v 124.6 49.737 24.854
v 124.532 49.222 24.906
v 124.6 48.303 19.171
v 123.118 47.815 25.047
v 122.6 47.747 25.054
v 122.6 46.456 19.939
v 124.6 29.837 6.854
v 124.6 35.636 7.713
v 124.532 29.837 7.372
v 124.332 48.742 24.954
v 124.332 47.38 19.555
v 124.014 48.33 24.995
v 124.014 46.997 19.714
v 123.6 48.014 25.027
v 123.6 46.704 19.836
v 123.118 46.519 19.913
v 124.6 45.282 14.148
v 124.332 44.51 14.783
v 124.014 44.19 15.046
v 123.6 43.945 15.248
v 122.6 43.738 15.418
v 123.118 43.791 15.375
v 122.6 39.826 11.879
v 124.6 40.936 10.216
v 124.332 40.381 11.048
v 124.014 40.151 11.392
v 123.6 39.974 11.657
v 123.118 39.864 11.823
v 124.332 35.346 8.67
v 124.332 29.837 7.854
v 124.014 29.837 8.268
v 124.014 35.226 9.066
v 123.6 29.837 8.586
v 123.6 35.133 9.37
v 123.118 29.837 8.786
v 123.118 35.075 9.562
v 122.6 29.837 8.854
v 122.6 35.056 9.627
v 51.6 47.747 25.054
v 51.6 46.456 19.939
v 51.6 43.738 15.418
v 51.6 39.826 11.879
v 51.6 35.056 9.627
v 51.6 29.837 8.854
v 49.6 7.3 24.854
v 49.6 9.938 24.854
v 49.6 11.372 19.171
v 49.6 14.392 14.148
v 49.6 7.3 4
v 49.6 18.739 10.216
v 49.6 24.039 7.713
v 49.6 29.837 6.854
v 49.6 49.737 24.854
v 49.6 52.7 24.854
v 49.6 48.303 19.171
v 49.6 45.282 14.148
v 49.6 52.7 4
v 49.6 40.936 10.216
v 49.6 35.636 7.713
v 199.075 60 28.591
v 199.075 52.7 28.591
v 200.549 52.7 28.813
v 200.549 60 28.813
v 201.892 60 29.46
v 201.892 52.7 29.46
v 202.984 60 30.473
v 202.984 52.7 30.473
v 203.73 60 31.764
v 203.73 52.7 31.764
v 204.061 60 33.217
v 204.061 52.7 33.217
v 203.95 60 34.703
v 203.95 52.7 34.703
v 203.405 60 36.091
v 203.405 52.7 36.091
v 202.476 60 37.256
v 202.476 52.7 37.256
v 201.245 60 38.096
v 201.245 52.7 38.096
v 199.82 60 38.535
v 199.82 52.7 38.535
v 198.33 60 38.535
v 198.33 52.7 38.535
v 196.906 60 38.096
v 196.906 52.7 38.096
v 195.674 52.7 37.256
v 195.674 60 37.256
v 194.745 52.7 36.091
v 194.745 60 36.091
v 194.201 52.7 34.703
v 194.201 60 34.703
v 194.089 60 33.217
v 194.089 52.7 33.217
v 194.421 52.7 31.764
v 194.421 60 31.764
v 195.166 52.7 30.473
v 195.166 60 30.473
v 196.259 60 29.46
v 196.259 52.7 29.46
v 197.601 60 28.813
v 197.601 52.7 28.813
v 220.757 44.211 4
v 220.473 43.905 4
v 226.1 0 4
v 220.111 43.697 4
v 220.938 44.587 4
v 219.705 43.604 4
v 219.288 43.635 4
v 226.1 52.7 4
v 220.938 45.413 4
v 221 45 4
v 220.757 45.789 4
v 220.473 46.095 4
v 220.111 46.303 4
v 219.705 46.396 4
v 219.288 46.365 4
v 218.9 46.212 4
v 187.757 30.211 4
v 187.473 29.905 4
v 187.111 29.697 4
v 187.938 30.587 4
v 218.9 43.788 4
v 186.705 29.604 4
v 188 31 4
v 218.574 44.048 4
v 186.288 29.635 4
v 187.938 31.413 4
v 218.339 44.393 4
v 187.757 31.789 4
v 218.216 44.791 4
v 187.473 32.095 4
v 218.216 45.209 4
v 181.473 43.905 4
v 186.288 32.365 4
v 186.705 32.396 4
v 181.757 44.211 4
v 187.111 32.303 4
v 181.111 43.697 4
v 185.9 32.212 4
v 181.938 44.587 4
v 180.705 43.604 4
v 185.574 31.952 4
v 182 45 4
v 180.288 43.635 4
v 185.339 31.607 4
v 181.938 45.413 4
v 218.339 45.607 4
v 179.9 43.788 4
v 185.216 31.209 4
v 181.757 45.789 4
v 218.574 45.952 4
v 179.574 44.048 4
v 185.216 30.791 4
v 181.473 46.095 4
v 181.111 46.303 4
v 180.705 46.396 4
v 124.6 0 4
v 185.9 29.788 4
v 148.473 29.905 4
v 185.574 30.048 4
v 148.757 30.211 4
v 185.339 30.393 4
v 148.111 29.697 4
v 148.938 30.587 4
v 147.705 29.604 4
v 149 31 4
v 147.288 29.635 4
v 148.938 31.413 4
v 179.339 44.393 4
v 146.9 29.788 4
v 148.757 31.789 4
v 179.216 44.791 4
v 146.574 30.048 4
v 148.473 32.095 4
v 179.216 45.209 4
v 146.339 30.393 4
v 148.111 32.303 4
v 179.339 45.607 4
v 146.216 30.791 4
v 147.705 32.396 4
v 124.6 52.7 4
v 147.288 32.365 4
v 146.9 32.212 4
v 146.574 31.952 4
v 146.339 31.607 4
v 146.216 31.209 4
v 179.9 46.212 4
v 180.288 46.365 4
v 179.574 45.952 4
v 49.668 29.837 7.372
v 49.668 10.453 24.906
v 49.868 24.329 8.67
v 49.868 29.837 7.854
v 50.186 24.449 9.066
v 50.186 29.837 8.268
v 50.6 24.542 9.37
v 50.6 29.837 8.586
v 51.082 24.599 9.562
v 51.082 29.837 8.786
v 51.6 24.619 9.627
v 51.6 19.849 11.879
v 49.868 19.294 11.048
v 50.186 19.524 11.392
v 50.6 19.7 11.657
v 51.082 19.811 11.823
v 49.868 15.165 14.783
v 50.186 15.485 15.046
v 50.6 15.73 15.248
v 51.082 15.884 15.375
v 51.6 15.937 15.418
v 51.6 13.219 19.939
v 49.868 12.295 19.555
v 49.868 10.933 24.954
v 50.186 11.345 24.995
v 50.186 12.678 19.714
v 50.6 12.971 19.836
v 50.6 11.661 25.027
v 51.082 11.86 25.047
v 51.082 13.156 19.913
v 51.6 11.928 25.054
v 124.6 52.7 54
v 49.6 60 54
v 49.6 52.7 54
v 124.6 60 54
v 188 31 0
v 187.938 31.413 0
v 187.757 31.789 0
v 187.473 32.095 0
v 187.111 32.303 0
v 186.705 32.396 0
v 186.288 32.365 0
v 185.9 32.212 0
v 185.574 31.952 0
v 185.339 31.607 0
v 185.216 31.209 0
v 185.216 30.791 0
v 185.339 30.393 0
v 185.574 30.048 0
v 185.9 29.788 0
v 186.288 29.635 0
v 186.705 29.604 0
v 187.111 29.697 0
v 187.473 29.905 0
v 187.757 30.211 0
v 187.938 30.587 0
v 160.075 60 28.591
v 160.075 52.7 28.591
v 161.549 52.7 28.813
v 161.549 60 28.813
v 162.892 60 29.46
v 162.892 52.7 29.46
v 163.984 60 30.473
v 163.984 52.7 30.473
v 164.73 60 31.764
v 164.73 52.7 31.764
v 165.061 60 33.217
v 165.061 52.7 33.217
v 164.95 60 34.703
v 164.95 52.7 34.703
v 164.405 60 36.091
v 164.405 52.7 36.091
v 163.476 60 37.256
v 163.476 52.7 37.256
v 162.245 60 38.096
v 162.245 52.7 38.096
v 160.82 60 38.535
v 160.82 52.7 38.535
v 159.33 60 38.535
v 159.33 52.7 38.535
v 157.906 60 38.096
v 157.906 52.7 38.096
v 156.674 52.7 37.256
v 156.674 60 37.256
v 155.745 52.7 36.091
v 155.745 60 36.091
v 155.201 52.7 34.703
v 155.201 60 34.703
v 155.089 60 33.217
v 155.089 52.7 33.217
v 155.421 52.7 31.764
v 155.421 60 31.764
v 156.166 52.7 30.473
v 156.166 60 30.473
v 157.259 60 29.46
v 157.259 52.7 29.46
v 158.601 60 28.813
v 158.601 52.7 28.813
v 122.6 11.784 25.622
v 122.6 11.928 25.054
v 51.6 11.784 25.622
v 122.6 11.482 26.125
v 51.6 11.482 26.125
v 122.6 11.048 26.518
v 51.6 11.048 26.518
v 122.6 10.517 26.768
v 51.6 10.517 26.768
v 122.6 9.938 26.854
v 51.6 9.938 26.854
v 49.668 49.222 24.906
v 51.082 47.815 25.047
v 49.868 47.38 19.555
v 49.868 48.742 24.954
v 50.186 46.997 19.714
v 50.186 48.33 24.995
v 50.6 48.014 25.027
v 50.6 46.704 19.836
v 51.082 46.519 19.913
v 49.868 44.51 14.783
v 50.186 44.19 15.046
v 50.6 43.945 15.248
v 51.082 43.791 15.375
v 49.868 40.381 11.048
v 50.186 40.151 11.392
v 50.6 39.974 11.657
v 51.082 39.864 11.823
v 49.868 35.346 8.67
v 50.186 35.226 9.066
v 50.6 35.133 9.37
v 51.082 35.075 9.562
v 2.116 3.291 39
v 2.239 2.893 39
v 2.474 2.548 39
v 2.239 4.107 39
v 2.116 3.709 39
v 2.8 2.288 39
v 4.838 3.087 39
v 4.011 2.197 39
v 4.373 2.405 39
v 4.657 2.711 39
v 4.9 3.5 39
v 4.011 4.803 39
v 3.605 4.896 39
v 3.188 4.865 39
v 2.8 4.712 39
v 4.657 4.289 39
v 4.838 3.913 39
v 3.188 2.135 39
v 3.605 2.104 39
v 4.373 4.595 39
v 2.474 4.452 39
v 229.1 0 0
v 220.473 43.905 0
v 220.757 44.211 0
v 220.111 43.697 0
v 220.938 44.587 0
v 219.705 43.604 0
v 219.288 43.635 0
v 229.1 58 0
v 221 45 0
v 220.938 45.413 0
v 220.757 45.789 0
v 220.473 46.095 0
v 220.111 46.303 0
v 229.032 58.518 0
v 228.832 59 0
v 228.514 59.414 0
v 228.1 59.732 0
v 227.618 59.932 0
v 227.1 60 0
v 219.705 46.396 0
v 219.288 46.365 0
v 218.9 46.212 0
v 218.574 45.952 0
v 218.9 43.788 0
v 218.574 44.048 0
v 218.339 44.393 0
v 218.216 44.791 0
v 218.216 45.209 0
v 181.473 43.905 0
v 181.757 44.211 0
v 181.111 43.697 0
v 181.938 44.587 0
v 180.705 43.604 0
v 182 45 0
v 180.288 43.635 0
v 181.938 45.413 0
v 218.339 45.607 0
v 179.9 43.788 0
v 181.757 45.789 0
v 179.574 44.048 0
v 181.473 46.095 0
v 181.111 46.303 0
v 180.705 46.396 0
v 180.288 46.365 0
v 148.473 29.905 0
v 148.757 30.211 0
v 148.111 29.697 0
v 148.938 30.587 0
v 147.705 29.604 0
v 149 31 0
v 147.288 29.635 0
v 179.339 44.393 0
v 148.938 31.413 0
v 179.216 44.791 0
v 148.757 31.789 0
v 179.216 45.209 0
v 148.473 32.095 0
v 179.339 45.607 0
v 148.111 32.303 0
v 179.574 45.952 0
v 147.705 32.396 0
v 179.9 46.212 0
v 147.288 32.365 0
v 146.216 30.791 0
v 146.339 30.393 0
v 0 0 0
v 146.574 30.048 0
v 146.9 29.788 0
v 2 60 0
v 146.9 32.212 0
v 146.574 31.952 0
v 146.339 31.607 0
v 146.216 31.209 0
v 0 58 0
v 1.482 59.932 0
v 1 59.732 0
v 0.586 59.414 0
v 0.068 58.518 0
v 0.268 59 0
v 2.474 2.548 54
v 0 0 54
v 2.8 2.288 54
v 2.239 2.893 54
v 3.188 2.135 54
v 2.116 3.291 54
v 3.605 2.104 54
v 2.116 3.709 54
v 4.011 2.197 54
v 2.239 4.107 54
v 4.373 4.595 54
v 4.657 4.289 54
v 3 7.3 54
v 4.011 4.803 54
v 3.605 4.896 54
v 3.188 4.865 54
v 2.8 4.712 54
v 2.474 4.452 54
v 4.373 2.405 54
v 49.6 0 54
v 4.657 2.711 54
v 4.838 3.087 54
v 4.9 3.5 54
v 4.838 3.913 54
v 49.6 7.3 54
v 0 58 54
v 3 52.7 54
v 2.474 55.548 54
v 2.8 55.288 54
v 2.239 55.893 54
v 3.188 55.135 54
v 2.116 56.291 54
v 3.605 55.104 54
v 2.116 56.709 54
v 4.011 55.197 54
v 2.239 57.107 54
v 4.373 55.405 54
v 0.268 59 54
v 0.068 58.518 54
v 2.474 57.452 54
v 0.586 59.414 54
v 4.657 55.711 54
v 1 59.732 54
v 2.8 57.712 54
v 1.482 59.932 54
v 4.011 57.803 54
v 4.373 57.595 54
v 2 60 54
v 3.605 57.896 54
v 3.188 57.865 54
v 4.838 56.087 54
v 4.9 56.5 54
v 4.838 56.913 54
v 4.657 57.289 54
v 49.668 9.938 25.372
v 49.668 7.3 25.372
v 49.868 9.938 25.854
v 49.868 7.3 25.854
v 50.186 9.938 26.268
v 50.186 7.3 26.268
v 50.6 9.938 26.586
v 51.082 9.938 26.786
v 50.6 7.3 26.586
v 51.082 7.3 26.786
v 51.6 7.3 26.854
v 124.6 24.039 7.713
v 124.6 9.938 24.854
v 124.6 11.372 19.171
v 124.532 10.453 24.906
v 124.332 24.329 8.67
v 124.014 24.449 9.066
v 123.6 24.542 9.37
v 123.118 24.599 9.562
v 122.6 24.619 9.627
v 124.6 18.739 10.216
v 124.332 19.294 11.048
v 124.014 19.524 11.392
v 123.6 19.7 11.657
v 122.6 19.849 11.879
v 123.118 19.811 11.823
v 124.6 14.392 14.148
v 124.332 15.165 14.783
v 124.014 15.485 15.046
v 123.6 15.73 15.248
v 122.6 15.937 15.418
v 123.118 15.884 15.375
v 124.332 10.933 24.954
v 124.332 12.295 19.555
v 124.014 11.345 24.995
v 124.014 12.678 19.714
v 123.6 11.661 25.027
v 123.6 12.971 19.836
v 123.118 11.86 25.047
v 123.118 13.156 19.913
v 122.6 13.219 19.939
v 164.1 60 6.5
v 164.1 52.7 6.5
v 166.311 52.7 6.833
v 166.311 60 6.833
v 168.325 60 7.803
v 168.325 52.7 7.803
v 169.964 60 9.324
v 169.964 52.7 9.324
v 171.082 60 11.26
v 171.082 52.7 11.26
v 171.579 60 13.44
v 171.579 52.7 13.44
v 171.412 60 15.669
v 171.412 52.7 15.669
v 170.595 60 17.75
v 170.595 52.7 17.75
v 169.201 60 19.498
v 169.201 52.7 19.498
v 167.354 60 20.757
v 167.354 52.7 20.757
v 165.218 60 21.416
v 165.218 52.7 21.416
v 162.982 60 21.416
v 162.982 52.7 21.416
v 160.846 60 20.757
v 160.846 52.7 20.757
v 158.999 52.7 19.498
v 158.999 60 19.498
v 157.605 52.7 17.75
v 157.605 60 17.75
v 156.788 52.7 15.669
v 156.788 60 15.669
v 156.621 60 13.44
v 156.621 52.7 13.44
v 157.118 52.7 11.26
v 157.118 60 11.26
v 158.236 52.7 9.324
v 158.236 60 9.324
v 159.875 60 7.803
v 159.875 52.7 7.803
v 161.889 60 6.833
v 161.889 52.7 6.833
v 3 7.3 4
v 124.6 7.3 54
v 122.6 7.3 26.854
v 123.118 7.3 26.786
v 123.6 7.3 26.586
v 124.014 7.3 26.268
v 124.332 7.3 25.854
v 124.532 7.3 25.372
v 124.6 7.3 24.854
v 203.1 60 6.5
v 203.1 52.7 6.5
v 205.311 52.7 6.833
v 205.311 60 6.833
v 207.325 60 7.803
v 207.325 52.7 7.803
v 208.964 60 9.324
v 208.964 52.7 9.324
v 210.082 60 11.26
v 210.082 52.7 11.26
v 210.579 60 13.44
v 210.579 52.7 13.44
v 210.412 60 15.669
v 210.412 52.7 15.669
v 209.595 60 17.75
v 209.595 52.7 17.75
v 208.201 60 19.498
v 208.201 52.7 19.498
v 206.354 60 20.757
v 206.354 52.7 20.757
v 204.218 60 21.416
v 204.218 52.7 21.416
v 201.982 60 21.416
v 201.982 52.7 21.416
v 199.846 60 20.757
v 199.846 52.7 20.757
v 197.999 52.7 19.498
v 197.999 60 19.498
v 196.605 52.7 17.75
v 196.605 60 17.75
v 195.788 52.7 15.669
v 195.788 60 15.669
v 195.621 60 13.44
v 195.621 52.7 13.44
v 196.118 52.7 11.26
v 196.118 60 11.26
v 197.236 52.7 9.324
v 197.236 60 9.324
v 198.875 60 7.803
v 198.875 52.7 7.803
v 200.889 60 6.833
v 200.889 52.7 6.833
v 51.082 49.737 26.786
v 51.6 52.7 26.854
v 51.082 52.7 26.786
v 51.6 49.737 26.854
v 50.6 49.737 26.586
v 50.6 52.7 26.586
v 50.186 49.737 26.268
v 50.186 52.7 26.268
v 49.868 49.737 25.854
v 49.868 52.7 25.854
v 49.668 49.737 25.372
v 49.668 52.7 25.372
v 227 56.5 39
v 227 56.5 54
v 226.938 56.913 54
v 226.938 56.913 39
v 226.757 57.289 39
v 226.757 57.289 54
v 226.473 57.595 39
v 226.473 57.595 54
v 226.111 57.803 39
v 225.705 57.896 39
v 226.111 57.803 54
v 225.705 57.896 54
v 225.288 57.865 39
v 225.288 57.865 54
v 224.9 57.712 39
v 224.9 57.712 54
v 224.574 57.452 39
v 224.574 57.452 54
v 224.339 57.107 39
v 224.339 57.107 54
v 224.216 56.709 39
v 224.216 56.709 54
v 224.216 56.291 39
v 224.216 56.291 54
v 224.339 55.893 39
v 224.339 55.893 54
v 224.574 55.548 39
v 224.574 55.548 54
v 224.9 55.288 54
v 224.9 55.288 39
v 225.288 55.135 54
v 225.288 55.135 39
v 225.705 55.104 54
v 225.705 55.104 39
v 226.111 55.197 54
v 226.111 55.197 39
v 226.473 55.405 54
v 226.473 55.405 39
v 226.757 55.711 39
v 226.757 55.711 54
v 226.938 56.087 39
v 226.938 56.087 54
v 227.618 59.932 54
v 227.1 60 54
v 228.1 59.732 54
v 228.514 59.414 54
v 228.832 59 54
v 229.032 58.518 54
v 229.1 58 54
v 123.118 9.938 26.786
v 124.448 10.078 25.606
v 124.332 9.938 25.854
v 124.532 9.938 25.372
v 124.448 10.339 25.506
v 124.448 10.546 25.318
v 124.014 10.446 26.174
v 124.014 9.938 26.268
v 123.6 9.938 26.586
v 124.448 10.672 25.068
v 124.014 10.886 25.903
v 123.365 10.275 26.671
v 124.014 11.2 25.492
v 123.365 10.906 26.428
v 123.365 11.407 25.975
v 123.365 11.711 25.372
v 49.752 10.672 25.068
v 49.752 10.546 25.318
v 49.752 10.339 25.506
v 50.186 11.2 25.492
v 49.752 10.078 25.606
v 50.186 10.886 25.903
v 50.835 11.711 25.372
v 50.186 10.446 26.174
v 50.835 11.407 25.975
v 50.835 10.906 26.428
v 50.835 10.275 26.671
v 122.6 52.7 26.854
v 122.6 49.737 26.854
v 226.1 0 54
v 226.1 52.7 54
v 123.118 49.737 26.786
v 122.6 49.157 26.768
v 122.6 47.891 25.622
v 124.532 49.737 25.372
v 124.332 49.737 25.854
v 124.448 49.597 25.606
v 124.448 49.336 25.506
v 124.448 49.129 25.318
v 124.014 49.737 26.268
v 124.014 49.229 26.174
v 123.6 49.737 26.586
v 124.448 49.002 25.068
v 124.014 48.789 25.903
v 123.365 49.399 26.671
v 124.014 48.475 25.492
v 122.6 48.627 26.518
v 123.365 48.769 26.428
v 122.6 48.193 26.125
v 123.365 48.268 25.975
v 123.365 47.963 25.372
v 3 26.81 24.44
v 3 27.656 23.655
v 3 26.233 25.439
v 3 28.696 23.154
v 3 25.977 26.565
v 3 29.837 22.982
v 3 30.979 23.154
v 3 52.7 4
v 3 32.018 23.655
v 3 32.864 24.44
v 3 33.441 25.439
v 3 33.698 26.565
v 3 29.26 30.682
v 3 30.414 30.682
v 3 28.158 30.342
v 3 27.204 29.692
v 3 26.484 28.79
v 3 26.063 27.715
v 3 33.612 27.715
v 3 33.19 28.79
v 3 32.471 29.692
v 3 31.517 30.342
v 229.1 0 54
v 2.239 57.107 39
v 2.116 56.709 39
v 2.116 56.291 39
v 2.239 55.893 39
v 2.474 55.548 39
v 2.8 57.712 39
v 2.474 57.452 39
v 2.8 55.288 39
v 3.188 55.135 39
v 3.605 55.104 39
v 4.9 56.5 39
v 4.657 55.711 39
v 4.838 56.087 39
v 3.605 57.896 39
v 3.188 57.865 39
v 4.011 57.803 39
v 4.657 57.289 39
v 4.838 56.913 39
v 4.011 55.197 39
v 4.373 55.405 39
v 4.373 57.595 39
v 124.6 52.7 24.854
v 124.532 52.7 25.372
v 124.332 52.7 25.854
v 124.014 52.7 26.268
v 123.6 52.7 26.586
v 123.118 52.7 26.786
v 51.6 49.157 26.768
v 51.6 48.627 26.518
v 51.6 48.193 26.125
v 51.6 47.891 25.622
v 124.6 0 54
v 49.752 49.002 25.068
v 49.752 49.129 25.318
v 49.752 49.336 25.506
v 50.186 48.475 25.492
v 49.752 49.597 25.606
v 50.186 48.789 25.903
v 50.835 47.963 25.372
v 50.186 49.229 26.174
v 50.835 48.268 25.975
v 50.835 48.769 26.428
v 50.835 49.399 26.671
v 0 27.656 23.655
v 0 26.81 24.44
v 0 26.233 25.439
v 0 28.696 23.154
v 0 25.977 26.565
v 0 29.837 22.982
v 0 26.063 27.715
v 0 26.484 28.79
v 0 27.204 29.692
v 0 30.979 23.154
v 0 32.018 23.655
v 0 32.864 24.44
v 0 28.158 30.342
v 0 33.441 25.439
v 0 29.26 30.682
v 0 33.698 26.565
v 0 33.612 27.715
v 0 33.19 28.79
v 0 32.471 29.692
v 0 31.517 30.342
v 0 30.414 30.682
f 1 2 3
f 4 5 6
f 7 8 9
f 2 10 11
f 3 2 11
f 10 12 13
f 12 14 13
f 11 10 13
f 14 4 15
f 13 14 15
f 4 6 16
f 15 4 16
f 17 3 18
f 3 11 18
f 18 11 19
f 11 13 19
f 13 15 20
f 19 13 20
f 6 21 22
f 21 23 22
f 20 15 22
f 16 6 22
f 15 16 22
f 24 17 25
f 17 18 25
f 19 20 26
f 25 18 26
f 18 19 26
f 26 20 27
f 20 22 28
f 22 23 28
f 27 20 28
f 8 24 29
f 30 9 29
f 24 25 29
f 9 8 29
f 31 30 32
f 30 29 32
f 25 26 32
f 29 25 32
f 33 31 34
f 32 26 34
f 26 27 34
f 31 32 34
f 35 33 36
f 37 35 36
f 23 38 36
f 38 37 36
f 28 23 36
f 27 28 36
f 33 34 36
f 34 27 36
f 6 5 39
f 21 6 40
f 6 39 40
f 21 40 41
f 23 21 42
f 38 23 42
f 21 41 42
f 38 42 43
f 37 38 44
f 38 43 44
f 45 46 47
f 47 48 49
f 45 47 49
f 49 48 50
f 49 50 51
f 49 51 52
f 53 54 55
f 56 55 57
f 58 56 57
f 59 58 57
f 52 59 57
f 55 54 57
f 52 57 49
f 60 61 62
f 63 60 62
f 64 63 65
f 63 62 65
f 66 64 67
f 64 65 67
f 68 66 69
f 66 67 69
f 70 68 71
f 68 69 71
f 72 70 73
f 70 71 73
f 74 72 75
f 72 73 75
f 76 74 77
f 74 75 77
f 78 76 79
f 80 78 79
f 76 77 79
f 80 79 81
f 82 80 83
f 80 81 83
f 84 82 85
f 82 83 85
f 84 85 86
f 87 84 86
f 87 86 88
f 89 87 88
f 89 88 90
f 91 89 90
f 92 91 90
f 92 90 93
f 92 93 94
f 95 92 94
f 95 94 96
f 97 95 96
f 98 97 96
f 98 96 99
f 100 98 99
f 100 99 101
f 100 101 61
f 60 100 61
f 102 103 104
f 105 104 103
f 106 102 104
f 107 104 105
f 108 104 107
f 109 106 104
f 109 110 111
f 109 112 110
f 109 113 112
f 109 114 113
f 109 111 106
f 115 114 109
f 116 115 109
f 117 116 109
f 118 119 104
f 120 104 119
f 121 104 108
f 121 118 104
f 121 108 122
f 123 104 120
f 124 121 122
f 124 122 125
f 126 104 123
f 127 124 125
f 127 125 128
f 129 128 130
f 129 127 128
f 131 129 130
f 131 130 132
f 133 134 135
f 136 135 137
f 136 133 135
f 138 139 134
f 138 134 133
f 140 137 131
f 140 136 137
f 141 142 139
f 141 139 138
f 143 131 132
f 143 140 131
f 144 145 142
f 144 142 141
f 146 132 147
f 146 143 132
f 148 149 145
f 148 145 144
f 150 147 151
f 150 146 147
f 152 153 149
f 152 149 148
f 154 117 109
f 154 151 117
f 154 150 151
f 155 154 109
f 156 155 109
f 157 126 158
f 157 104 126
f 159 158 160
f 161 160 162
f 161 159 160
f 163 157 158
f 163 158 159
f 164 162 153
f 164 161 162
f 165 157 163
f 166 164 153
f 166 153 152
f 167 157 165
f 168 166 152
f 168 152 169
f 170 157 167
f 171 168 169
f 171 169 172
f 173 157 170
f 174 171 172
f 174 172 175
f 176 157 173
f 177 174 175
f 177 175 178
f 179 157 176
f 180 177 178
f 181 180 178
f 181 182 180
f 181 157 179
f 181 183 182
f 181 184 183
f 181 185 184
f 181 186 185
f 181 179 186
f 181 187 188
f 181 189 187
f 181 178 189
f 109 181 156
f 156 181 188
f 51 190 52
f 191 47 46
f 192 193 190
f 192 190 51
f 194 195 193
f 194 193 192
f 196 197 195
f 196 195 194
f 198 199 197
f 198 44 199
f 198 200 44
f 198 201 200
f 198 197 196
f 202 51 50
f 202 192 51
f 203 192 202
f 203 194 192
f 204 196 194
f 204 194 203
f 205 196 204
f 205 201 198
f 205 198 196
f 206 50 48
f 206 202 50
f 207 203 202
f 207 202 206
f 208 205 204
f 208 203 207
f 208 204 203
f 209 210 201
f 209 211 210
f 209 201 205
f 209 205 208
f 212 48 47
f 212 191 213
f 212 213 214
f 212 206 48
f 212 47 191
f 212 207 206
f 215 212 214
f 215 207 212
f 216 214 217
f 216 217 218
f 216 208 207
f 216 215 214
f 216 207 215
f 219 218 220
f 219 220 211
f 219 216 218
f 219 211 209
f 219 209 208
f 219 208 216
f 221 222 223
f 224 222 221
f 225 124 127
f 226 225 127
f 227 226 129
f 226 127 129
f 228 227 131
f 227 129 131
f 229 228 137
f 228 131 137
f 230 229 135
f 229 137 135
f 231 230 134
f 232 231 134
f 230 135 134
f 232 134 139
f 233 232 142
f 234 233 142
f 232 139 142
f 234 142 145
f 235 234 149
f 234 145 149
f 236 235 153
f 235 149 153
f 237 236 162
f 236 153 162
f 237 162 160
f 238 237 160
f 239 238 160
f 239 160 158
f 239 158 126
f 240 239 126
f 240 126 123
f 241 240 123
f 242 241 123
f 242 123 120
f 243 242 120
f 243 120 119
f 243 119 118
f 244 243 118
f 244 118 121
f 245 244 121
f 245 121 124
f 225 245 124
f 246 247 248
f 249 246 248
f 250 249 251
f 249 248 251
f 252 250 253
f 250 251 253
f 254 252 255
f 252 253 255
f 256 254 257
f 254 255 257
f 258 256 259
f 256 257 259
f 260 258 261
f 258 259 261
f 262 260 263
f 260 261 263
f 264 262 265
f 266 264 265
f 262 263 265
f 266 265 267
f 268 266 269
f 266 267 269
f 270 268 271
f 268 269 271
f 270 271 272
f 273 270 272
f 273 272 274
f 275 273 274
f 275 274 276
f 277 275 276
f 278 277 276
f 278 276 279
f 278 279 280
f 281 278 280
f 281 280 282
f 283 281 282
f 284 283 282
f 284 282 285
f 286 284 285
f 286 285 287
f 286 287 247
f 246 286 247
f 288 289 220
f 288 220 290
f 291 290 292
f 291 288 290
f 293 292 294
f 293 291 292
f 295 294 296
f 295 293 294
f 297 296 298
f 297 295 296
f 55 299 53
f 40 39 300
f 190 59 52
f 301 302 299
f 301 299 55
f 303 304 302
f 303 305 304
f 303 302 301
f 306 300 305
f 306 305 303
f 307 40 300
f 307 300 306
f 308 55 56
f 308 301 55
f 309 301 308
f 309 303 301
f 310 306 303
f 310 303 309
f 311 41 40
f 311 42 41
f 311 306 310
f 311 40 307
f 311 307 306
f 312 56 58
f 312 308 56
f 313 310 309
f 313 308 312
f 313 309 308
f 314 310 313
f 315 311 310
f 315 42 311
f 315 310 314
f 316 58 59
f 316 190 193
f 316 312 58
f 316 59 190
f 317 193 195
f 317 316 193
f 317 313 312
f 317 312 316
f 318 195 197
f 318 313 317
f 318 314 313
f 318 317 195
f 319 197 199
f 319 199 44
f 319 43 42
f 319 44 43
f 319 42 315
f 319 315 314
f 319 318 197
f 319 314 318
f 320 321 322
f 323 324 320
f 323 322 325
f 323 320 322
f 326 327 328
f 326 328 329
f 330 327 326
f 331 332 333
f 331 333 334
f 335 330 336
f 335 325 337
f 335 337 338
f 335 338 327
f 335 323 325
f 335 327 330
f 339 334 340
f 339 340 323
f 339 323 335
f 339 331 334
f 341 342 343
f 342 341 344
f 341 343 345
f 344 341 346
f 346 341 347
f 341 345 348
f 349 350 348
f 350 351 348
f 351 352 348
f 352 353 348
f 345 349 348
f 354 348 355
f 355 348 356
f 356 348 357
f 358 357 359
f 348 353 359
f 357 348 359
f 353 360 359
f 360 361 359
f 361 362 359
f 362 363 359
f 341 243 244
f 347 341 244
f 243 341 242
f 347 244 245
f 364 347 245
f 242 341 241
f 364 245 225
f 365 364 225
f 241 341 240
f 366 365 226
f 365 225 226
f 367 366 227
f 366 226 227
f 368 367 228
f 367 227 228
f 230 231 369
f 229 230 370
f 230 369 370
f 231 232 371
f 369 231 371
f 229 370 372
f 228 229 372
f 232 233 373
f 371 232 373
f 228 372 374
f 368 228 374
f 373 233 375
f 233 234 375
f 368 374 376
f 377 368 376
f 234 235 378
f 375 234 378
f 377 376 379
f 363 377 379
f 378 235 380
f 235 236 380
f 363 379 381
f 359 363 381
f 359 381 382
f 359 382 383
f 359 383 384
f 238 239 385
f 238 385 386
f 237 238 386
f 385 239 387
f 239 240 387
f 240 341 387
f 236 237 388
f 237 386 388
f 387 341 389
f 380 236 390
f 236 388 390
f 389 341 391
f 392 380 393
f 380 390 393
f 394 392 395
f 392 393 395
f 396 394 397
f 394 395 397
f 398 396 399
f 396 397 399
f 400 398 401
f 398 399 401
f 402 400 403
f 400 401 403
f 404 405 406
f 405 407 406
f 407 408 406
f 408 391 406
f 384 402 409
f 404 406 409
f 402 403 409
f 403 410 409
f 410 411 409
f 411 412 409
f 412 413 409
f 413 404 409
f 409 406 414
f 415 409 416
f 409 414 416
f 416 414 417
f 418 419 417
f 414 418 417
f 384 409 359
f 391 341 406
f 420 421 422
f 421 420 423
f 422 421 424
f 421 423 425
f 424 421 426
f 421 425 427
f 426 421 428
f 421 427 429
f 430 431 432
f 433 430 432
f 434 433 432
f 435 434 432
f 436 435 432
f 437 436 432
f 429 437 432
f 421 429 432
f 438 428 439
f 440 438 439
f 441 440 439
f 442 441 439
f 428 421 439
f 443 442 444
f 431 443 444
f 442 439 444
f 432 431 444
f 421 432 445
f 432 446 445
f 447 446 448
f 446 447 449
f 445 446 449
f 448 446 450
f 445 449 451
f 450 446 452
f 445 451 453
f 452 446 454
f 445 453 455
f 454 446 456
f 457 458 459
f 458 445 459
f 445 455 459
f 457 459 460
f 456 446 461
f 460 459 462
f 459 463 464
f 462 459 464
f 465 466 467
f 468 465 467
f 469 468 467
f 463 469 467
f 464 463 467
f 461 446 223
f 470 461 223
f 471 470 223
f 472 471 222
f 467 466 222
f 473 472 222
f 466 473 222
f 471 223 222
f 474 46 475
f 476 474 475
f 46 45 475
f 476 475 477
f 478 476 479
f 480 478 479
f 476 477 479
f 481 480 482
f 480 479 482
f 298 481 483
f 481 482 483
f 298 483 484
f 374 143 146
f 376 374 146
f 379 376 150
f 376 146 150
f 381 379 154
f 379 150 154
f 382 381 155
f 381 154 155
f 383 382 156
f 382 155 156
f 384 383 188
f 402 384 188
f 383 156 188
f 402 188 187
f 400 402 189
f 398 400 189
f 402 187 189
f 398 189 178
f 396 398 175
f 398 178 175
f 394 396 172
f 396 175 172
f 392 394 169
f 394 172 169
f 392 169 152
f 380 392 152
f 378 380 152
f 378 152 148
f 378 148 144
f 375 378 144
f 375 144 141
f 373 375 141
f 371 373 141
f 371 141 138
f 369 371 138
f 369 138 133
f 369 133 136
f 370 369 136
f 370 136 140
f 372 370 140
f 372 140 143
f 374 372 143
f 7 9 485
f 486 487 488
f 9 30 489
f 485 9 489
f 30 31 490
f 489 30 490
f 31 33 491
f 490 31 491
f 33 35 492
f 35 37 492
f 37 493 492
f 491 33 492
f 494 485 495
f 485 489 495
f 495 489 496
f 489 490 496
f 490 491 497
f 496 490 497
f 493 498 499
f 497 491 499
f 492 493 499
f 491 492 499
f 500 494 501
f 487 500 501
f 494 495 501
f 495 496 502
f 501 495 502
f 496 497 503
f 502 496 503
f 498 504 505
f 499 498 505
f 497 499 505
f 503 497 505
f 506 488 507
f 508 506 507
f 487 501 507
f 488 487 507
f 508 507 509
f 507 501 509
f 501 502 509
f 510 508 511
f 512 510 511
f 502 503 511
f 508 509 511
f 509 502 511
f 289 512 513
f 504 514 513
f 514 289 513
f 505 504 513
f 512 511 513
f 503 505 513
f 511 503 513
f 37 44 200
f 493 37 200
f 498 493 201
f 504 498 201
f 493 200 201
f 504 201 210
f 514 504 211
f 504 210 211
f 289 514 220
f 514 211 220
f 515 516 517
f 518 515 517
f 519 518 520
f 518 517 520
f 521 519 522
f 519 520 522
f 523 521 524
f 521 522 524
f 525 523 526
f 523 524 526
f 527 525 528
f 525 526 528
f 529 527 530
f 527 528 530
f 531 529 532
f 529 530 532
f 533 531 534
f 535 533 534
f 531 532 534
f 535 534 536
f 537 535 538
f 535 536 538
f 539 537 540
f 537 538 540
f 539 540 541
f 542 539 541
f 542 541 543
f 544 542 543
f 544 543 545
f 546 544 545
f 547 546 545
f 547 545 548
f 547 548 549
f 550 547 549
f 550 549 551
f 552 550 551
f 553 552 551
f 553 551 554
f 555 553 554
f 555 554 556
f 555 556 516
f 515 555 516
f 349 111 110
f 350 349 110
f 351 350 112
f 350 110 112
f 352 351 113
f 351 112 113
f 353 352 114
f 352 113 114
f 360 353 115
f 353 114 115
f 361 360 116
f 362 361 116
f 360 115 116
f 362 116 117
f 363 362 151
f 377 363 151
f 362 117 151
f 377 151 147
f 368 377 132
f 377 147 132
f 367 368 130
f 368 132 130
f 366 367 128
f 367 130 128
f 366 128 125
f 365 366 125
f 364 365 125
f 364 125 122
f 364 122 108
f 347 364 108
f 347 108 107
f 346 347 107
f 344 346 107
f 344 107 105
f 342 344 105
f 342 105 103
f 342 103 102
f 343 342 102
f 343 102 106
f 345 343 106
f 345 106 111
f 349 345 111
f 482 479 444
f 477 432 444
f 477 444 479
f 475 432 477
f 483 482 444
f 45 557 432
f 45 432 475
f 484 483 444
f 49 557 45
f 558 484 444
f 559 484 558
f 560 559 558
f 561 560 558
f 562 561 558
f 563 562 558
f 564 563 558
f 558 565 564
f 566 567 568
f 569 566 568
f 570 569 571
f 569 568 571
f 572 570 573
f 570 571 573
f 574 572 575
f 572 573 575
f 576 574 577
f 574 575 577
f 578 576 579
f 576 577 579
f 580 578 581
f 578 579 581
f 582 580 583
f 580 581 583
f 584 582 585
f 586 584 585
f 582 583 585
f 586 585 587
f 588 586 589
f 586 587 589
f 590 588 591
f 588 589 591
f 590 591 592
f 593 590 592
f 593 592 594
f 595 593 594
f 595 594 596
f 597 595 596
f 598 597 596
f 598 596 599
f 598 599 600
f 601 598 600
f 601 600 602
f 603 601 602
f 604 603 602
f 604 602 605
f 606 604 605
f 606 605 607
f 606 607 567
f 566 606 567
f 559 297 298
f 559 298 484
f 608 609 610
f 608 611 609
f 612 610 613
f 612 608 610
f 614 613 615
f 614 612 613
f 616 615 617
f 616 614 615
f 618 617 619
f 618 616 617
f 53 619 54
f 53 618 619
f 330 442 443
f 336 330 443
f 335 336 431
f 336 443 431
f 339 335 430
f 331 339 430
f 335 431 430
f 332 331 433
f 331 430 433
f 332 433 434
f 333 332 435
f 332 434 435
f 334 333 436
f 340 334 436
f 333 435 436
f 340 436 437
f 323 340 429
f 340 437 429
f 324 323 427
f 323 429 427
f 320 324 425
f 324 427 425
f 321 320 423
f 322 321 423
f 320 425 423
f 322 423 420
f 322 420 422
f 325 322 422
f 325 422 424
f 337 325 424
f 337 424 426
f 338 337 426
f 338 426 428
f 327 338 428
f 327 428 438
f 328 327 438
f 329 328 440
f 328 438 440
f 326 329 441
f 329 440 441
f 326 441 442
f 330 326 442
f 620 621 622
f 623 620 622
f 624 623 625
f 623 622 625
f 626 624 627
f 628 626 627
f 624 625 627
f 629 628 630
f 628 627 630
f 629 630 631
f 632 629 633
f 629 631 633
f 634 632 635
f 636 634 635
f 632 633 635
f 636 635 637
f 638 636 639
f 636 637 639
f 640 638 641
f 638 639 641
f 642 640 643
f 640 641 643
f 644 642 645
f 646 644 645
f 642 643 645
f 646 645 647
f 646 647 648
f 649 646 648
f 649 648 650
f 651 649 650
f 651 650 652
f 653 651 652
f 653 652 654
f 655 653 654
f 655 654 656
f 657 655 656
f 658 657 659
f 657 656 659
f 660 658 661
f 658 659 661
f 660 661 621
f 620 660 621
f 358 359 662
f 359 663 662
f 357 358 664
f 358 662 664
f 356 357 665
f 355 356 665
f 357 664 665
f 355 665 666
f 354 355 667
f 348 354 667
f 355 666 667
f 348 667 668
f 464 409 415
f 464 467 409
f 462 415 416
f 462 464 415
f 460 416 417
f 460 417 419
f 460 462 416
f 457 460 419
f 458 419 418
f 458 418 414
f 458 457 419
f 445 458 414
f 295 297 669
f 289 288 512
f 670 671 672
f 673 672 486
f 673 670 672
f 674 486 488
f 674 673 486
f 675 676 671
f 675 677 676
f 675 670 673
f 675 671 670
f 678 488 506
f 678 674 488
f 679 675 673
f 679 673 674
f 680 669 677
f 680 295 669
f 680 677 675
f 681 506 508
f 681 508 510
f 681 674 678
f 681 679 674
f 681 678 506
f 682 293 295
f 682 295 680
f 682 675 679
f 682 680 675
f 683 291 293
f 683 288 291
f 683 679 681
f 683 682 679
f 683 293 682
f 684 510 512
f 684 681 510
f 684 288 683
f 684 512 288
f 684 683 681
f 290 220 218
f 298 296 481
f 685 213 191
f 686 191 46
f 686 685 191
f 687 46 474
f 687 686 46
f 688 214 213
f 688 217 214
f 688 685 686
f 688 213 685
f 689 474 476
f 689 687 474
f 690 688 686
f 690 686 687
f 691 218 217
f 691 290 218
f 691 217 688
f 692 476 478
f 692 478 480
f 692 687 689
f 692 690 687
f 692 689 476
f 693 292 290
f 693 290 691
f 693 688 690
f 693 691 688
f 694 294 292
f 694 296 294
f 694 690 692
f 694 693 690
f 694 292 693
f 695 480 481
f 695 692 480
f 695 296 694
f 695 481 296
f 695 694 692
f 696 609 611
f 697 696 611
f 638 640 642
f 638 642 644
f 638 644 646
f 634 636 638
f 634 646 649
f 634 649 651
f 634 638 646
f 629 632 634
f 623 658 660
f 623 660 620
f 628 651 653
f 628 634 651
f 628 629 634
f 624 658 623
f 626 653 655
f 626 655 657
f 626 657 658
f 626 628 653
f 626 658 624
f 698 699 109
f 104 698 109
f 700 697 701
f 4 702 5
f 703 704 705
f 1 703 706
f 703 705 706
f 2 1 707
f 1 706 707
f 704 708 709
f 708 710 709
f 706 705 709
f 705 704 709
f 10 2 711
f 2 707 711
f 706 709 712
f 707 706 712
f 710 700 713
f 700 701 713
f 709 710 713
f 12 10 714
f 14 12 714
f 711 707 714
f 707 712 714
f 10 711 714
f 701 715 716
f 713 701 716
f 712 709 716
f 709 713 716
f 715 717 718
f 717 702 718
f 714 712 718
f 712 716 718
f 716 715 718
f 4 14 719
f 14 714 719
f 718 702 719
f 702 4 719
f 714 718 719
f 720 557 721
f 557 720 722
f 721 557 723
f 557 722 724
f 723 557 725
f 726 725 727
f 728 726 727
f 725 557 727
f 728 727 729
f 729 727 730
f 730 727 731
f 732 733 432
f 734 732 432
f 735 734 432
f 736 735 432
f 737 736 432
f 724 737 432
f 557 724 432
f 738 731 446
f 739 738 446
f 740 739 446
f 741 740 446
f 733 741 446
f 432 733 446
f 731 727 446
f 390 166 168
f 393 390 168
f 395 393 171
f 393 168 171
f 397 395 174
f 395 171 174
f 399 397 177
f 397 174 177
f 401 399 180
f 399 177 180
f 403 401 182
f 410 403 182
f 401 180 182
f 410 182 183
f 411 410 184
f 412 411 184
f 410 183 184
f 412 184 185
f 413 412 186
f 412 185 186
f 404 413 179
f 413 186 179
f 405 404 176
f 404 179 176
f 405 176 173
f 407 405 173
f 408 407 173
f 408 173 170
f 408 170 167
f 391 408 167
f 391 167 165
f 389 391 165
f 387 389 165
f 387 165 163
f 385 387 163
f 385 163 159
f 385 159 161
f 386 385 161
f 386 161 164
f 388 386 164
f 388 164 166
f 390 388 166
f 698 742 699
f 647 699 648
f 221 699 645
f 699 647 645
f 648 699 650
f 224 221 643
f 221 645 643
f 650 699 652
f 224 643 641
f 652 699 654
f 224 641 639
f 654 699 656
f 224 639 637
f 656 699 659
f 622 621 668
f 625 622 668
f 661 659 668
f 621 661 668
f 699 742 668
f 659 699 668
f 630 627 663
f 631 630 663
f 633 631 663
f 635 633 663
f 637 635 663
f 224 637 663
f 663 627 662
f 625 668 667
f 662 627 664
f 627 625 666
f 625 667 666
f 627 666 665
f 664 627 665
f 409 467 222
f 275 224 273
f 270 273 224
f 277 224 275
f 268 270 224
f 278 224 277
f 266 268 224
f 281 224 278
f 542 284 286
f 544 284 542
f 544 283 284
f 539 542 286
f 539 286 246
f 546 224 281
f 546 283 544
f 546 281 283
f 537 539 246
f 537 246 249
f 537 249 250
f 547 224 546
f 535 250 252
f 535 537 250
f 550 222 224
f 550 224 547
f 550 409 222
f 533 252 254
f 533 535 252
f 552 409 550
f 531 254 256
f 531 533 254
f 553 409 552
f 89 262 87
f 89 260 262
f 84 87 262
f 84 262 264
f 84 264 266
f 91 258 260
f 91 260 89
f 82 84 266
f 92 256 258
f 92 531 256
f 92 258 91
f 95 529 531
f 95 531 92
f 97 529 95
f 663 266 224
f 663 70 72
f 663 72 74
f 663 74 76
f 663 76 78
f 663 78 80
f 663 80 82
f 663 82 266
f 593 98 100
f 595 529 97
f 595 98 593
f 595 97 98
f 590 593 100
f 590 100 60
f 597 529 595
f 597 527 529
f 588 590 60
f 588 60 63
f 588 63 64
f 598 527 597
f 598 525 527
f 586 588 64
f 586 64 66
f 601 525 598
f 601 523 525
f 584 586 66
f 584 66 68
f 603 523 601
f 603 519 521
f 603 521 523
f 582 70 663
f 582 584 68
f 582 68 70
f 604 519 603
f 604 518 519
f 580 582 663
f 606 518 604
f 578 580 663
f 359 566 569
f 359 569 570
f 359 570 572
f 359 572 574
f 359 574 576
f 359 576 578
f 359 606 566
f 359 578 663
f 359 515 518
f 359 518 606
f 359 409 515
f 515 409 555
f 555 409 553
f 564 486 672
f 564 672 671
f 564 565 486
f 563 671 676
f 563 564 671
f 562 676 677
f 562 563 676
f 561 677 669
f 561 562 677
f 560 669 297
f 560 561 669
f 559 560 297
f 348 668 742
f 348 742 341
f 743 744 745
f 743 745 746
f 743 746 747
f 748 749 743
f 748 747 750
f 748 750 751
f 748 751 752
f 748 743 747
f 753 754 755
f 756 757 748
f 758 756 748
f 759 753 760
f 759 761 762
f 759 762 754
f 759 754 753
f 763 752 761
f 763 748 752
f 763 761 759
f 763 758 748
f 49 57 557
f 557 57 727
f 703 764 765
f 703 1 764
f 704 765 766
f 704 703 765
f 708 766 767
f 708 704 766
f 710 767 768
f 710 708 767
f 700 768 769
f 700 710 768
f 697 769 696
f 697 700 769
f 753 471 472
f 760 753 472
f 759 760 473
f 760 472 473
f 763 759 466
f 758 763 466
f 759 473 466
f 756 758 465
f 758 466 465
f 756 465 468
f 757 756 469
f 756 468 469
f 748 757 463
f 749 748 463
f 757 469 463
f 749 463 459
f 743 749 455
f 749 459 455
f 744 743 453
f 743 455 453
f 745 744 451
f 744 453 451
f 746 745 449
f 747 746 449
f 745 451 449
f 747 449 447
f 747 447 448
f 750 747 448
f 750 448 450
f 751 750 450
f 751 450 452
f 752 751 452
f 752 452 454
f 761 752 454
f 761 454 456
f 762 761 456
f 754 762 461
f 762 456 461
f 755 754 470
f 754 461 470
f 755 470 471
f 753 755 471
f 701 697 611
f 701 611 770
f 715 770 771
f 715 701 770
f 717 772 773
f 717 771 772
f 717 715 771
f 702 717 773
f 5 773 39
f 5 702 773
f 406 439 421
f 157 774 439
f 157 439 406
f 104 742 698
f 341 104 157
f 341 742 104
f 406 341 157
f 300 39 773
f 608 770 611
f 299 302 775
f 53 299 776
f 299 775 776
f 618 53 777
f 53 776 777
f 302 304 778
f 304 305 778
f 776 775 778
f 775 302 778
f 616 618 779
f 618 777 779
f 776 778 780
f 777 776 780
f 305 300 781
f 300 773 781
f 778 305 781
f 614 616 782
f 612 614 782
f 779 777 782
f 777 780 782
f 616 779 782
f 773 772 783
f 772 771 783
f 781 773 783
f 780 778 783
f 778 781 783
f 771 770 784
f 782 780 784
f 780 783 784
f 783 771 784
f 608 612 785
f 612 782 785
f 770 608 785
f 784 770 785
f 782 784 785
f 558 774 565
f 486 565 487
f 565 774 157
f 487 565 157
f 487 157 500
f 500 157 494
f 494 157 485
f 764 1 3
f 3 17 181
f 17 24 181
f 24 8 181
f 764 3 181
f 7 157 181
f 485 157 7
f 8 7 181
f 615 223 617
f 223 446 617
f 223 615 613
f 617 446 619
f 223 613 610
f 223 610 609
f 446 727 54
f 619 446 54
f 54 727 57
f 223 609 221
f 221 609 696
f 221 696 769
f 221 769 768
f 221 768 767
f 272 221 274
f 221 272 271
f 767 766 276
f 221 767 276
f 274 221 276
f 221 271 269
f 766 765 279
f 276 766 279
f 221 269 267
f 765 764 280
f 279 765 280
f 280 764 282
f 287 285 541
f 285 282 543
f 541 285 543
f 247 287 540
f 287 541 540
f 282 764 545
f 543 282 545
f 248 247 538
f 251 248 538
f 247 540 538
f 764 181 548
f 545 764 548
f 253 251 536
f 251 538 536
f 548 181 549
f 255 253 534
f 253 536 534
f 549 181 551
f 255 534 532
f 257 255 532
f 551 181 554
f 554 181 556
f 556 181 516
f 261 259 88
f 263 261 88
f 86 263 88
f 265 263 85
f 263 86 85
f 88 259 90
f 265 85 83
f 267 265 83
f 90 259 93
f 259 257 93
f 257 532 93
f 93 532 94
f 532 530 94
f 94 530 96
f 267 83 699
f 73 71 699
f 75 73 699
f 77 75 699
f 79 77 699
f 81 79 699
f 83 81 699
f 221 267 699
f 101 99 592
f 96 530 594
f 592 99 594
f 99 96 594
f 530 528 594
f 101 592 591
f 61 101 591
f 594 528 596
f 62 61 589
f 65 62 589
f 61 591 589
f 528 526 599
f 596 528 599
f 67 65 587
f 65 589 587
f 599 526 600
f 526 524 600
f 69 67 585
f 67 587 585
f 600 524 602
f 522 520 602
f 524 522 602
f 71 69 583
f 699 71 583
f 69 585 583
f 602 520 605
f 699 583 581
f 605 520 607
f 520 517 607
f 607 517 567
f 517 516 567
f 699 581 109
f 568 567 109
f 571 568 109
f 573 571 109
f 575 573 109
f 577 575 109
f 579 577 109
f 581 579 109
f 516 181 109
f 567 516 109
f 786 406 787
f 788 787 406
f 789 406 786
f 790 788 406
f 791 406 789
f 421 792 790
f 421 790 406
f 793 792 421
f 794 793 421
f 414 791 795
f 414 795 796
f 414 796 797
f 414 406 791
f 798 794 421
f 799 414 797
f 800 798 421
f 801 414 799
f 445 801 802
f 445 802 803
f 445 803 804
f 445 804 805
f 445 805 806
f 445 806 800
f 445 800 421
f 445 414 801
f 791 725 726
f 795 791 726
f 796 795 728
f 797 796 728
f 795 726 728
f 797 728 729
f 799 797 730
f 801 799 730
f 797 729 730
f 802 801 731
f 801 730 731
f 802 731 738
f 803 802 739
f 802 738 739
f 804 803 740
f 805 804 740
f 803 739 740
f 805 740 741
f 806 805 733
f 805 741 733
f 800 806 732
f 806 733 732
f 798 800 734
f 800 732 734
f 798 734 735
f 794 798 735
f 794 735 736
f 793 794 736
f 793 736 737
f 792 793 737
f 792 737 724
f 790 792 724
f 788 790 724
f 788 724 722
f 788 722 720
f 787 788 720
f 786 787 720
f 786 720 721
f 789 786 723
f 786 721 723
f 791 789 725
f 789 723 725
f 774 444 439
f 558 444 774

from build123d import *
from build123d.topology import SkipClean

# Parameters (mm, degrees)
SKETCH_1_W          = 46.6
SKETCH_1_H          = 7.3
EXTRUDE_1_DEPTH     = 54
EXTRUDE_1_2_DEPTH   = 54
SKETCH_2_W          = 46.6
SKETCH_2_H          = 45.4
EXTRUDE_2_DEPTH     = 4
SKETCH_3_W          = 54
SKETCH_3_H          = 60
EXTRUDE_3_DEPTH     = 3
SKETCH_4_R          = 3.871689423
CUT_EXTRUDE_1_DEPTH = 3
EXTRUDE_4_DEPTH     = 75
SKETCH_6_W          = 75
SKETCH_6_H          = 7.3
EXTRUDE_5_DEPTH     = 27.146082
SKETCH_7_W          = 4
SKETCH_7_H          = 60
EXTRUDE_6_DEPTH     = 104.5
SKETCH_8_R          = 1.4
CUT_EXTRUDE_2_DEPTH = 75
SKETCH_10_W         = 104.5
SKETCH_10_H         = 50
EXTRUDE_7_DEPTH     = 7.3
SKETCH_11_R         = 7.5
SKETCH_11_R_2       = 5
CUT_EXTRUDE_3_DEPTH = 16
SKETCH_12_W         = 54
SKETCH_12_H         = 60
EXTRUDE_8_DEPTH     = 3
SKETCH_13_R         = 1.4
CUT_EXTRUDE_4_DEPTH = 15
FILLET_1_R          = 2
FILLET_2_R          = 2


with BuildPart() as part:
    # ｽｹｯﾁ1 → ﾎﾞｽ - 押し出し1 (new body)
    with BuildSketch(Plane.XY):
        with Locations((26.3, 3.65)):
            Rectangle(SKETCH_1_W, SKETCH_1_H)
    extrude(amount=EXTRUDE_1_DEPTH)



with BuildPart() as body_2:
    # ｽｹｯﾁ1 → Extrude 1 2 (new body)
    with BuildSketch(Plane.XY):
        with Locations((26.3, 56.35)):
            Rectangle(SKETCH_1_W, SKETCH_1_H)
    extrude(amount=EXTRUDE_1_2_DEPTH)


with BuildPart() as part_1:
    add(part.part)

    add(body_2.part)  # ﾎﾞｽ - 押し出し2 merges body 2
    # ｽｹｯﾁ2 → ﾎﾞｽ - 押し出し2 (add)
    with BuildSketch(Plane(origin=(0, 0, 0), x_dir=(-1, 0, 0), z_dir=(0, 0, -1))):
        with Locations((-26.3, 30)):
            Rectangle(SKETCH_2_W, SKETCH_2_H)
    extrude(amount=-EXTRUDE_2_DEPTH)

    # ｽｹｯﾁ3 → ﾎﾞｽ - 押し出し3 (add)
    with BuildSketch(Plane.ZY.offset(-3)):
        with Locations((27, 30)):
            Rectangle(SKETCH_3_W, SKETCH_3_H)
    extrude(amount=EXTRUDE_3_DEPTH)

    # ｽｹｯﾁ4 → ｶｯﾄ - 押し出し1 (cut)
    with BuildSketch(Plane(origin=(3, 0, 0), x_dir=(0, 0, -1), z_dir=(1, 0, 0))):
        with Locations((-26.853917863, 29.837440161)):
            Circle(SKETCH_4_R)
    extrude(amount=-CUT_EXTRUDE_1_DEPTH, mode=Mode.SUBTRACT)

    # ｽｹｯﾁ5 → ﾎﾞｽ - 押し出し4 (add)
    with BuildSketch(Plane(origin=(49.6, 0, 0), x_dir=(0, 0, -1), z_dir=(1, 0, 0))):
        Polygon((0, 0), (0, 60), (-26.853917863, 60), (-26.853917863, 52.7), (-4, 52.7), (-4, 7.3), (-26.853917863, 7.3), (-26.853917863, 0), align=None)
        with BuildLine():
            Line((-4, 52.7), (-26.853917863, 52.7))
            Line((-26.853917863, 52.7), (-26.853917863, 47.837440161))
            ThreePointArc((-26.853917863, 47.837440161), (-14.125995802, 42.565362223), (-8.853917863, 29.837440161))
            ThreePointArc((-8.853917863, 29.837440161), (-14.125995802, 17.1095181), (-26.853917863, 11.837440161))
            Line((-26.853917863, 11.837440161), (-26.853917863, 7.3))
            Line((-26.853917863, 7.3), (-4, 7.3))
            Line((-4, 7.3), (-4, 52.7))
        make_face()
    extrude(amount=EXTRUDE_4_DEPTH)

    # ｽｹｯﾁ6 → ﾎﾞｽ - 押し出し5 (add)
    with BuildSketch(Plane.XY.offset(26.853917863)):
        with Locations((87.1, 56.35)):
            Rectangle(SKETCH_6_W, SKETCH_6_H)
        with Locations((87.1, 3.65)):
            Rectangle(SKETCH_6_W, SKETCH_6_H)
    extrude(amount=EXTRUDE_5_DEPTH)

    # ｽｹｯﾁ7 → ﾎﾞｽ - 押し出し6 (add)
    with BuildSketch(Plane(origin=(124.6, 0, 0), x_dir=(0, 0, -1), z_dir=(1, 0, 0))):
        with Locations((-2, 30)):
            Rectangle(SKETCH_7_W, SKETCH_7_H)
    extrude(amount=EXTRUDE_6_DEPTH)

    # ｽｹｯﾁ8 → ｶｯﾄ - 押し出し2 (cut)
    with BuildSketch(Plane.XY.offset(4)):
        with Locations((147.6, 31)):
            Circle(SKETCH_8_R)
        with Locations((180.6, 45)):
            Circle(SKETCH_8_R)
        with Locations((186.6, 31)):
            Circle(SKETCH_8_R)
        with Locations((219.6, 45)):
            Circle(SKETCH_8_R)
    extrude(amount=-CUT_EXTRUDE_2_DEPTH, mode=Mode.SUBTRACT)

    # ｽｹｯﾁ10 → ﾎﾞｽ - 押し出し7 (add)
    with SkipClean():  # the faces are left unmerged after this step: merging them gives an invalid solid
        with BuildSketch(Plane(origin=(0, 60, 0), x_dir=(1, 0, 0), z_dir=(0, 1, 0))):
            with Locations((176.85, -29)):
                Rectangle(SKETCH_10_W, SKETCH_10_H)
        extrude(amount=-EXTRUDE_7_DEPTH)

    # ｽｹｯﾁ11 → ｶｯﾄ - 押し出し3 (cut)
    with SkipClean():  # the faces are left unmerged after this step: merging them gives an invalid solid
        with BuildSketch(Plane(origin=(0, 52.7, 0), x_dir=(-1, 0, 0), z_dir=(0, -1, 0))):
            with Locations(Location((-164.1, -14, 0), (0, 0, 90))):
                Circle(SKETCH_11_R)
            with Locations(Location((-203.1, -14, 0), (0, 0, 90))):
                Circle(SKETCH_11_R)
            with Locations(Location((-199.075229873, -33.590845449, 0), (0, 0, 90))):
                Circle(SKETCH_11_R_2)
            with Locations(Location((-160.075229873, -33.590845449, 0), (0, 0, 90))):
                Circle(SKETCH_11_R_2)
        extrude(amount=-CUT_EXTRUDE_3_DEPTH, mode=Mode.SUBTRACT)

    # ｽｹｯﾁ12 → ﾎﾞｽ - 押し出し8 (add)
    with BuildSketch(Plane(origin=(229.1, 0, 0), x_dir=(0, 0, -1), z_dir=(1, 0, 0))):
        with Locations((-27, 30)):
            Rectangle(SKETCH_12_W, SKETCH_12_H)
    extrude(amount=-EXTRUDE_8_DEPTH)

    # ｽｹｯﾁ13 → ｶｯﾄ - 押し出し4 (cut)
    with BuildSketch(Plane.XY.offset(54)):
        with Locations((3.5, 3.5)):
            Circle(SKETCH_13_R)
        with Locations((3.5, 56.5)):
            Circle(SKETCH_13_R)
        with Locations((225.6, 56.5)):
            Circle(SKETCH_13_R)
    extrude(amount=-CUT_EXTRUDE_4_DEPTH, mode=Mode.SUBTRACT)

    # ﾌｨﾚｯﾄ1
    fillet_1_edges = [part_1.edges().sort_by_distance(p)[0] for p in [
        (49.6, 29.837440161, 8.853917863),
        (49.6, 50.268720081, 26.853917863),
        (124.6, 29.837440161, 8.853917863),
        (87.1, 47.837440161, 26.853917863),
        (49.6, 9.568720081, 26.853917863),
        (87.1, 11.837440161, 26.853917863),
        (124.6, 9.568720081, 26.853917863),
        (124.6, 50.268720081, 26.853917863),
    ]]
    fillet(fillet_1_edges, radius=FILLET_1_R)

    # ﾌｨﾚｯﾄ2
    fillet_2_edges = [part_1.edges().sort_by_distance(p)[0] for p in [
        (229.1, 60, 27),
        (0, 60, 27),
    ]]
    fillet(fillet_2_edges, radius=FILLET_2_R)


solid = part_1.part
